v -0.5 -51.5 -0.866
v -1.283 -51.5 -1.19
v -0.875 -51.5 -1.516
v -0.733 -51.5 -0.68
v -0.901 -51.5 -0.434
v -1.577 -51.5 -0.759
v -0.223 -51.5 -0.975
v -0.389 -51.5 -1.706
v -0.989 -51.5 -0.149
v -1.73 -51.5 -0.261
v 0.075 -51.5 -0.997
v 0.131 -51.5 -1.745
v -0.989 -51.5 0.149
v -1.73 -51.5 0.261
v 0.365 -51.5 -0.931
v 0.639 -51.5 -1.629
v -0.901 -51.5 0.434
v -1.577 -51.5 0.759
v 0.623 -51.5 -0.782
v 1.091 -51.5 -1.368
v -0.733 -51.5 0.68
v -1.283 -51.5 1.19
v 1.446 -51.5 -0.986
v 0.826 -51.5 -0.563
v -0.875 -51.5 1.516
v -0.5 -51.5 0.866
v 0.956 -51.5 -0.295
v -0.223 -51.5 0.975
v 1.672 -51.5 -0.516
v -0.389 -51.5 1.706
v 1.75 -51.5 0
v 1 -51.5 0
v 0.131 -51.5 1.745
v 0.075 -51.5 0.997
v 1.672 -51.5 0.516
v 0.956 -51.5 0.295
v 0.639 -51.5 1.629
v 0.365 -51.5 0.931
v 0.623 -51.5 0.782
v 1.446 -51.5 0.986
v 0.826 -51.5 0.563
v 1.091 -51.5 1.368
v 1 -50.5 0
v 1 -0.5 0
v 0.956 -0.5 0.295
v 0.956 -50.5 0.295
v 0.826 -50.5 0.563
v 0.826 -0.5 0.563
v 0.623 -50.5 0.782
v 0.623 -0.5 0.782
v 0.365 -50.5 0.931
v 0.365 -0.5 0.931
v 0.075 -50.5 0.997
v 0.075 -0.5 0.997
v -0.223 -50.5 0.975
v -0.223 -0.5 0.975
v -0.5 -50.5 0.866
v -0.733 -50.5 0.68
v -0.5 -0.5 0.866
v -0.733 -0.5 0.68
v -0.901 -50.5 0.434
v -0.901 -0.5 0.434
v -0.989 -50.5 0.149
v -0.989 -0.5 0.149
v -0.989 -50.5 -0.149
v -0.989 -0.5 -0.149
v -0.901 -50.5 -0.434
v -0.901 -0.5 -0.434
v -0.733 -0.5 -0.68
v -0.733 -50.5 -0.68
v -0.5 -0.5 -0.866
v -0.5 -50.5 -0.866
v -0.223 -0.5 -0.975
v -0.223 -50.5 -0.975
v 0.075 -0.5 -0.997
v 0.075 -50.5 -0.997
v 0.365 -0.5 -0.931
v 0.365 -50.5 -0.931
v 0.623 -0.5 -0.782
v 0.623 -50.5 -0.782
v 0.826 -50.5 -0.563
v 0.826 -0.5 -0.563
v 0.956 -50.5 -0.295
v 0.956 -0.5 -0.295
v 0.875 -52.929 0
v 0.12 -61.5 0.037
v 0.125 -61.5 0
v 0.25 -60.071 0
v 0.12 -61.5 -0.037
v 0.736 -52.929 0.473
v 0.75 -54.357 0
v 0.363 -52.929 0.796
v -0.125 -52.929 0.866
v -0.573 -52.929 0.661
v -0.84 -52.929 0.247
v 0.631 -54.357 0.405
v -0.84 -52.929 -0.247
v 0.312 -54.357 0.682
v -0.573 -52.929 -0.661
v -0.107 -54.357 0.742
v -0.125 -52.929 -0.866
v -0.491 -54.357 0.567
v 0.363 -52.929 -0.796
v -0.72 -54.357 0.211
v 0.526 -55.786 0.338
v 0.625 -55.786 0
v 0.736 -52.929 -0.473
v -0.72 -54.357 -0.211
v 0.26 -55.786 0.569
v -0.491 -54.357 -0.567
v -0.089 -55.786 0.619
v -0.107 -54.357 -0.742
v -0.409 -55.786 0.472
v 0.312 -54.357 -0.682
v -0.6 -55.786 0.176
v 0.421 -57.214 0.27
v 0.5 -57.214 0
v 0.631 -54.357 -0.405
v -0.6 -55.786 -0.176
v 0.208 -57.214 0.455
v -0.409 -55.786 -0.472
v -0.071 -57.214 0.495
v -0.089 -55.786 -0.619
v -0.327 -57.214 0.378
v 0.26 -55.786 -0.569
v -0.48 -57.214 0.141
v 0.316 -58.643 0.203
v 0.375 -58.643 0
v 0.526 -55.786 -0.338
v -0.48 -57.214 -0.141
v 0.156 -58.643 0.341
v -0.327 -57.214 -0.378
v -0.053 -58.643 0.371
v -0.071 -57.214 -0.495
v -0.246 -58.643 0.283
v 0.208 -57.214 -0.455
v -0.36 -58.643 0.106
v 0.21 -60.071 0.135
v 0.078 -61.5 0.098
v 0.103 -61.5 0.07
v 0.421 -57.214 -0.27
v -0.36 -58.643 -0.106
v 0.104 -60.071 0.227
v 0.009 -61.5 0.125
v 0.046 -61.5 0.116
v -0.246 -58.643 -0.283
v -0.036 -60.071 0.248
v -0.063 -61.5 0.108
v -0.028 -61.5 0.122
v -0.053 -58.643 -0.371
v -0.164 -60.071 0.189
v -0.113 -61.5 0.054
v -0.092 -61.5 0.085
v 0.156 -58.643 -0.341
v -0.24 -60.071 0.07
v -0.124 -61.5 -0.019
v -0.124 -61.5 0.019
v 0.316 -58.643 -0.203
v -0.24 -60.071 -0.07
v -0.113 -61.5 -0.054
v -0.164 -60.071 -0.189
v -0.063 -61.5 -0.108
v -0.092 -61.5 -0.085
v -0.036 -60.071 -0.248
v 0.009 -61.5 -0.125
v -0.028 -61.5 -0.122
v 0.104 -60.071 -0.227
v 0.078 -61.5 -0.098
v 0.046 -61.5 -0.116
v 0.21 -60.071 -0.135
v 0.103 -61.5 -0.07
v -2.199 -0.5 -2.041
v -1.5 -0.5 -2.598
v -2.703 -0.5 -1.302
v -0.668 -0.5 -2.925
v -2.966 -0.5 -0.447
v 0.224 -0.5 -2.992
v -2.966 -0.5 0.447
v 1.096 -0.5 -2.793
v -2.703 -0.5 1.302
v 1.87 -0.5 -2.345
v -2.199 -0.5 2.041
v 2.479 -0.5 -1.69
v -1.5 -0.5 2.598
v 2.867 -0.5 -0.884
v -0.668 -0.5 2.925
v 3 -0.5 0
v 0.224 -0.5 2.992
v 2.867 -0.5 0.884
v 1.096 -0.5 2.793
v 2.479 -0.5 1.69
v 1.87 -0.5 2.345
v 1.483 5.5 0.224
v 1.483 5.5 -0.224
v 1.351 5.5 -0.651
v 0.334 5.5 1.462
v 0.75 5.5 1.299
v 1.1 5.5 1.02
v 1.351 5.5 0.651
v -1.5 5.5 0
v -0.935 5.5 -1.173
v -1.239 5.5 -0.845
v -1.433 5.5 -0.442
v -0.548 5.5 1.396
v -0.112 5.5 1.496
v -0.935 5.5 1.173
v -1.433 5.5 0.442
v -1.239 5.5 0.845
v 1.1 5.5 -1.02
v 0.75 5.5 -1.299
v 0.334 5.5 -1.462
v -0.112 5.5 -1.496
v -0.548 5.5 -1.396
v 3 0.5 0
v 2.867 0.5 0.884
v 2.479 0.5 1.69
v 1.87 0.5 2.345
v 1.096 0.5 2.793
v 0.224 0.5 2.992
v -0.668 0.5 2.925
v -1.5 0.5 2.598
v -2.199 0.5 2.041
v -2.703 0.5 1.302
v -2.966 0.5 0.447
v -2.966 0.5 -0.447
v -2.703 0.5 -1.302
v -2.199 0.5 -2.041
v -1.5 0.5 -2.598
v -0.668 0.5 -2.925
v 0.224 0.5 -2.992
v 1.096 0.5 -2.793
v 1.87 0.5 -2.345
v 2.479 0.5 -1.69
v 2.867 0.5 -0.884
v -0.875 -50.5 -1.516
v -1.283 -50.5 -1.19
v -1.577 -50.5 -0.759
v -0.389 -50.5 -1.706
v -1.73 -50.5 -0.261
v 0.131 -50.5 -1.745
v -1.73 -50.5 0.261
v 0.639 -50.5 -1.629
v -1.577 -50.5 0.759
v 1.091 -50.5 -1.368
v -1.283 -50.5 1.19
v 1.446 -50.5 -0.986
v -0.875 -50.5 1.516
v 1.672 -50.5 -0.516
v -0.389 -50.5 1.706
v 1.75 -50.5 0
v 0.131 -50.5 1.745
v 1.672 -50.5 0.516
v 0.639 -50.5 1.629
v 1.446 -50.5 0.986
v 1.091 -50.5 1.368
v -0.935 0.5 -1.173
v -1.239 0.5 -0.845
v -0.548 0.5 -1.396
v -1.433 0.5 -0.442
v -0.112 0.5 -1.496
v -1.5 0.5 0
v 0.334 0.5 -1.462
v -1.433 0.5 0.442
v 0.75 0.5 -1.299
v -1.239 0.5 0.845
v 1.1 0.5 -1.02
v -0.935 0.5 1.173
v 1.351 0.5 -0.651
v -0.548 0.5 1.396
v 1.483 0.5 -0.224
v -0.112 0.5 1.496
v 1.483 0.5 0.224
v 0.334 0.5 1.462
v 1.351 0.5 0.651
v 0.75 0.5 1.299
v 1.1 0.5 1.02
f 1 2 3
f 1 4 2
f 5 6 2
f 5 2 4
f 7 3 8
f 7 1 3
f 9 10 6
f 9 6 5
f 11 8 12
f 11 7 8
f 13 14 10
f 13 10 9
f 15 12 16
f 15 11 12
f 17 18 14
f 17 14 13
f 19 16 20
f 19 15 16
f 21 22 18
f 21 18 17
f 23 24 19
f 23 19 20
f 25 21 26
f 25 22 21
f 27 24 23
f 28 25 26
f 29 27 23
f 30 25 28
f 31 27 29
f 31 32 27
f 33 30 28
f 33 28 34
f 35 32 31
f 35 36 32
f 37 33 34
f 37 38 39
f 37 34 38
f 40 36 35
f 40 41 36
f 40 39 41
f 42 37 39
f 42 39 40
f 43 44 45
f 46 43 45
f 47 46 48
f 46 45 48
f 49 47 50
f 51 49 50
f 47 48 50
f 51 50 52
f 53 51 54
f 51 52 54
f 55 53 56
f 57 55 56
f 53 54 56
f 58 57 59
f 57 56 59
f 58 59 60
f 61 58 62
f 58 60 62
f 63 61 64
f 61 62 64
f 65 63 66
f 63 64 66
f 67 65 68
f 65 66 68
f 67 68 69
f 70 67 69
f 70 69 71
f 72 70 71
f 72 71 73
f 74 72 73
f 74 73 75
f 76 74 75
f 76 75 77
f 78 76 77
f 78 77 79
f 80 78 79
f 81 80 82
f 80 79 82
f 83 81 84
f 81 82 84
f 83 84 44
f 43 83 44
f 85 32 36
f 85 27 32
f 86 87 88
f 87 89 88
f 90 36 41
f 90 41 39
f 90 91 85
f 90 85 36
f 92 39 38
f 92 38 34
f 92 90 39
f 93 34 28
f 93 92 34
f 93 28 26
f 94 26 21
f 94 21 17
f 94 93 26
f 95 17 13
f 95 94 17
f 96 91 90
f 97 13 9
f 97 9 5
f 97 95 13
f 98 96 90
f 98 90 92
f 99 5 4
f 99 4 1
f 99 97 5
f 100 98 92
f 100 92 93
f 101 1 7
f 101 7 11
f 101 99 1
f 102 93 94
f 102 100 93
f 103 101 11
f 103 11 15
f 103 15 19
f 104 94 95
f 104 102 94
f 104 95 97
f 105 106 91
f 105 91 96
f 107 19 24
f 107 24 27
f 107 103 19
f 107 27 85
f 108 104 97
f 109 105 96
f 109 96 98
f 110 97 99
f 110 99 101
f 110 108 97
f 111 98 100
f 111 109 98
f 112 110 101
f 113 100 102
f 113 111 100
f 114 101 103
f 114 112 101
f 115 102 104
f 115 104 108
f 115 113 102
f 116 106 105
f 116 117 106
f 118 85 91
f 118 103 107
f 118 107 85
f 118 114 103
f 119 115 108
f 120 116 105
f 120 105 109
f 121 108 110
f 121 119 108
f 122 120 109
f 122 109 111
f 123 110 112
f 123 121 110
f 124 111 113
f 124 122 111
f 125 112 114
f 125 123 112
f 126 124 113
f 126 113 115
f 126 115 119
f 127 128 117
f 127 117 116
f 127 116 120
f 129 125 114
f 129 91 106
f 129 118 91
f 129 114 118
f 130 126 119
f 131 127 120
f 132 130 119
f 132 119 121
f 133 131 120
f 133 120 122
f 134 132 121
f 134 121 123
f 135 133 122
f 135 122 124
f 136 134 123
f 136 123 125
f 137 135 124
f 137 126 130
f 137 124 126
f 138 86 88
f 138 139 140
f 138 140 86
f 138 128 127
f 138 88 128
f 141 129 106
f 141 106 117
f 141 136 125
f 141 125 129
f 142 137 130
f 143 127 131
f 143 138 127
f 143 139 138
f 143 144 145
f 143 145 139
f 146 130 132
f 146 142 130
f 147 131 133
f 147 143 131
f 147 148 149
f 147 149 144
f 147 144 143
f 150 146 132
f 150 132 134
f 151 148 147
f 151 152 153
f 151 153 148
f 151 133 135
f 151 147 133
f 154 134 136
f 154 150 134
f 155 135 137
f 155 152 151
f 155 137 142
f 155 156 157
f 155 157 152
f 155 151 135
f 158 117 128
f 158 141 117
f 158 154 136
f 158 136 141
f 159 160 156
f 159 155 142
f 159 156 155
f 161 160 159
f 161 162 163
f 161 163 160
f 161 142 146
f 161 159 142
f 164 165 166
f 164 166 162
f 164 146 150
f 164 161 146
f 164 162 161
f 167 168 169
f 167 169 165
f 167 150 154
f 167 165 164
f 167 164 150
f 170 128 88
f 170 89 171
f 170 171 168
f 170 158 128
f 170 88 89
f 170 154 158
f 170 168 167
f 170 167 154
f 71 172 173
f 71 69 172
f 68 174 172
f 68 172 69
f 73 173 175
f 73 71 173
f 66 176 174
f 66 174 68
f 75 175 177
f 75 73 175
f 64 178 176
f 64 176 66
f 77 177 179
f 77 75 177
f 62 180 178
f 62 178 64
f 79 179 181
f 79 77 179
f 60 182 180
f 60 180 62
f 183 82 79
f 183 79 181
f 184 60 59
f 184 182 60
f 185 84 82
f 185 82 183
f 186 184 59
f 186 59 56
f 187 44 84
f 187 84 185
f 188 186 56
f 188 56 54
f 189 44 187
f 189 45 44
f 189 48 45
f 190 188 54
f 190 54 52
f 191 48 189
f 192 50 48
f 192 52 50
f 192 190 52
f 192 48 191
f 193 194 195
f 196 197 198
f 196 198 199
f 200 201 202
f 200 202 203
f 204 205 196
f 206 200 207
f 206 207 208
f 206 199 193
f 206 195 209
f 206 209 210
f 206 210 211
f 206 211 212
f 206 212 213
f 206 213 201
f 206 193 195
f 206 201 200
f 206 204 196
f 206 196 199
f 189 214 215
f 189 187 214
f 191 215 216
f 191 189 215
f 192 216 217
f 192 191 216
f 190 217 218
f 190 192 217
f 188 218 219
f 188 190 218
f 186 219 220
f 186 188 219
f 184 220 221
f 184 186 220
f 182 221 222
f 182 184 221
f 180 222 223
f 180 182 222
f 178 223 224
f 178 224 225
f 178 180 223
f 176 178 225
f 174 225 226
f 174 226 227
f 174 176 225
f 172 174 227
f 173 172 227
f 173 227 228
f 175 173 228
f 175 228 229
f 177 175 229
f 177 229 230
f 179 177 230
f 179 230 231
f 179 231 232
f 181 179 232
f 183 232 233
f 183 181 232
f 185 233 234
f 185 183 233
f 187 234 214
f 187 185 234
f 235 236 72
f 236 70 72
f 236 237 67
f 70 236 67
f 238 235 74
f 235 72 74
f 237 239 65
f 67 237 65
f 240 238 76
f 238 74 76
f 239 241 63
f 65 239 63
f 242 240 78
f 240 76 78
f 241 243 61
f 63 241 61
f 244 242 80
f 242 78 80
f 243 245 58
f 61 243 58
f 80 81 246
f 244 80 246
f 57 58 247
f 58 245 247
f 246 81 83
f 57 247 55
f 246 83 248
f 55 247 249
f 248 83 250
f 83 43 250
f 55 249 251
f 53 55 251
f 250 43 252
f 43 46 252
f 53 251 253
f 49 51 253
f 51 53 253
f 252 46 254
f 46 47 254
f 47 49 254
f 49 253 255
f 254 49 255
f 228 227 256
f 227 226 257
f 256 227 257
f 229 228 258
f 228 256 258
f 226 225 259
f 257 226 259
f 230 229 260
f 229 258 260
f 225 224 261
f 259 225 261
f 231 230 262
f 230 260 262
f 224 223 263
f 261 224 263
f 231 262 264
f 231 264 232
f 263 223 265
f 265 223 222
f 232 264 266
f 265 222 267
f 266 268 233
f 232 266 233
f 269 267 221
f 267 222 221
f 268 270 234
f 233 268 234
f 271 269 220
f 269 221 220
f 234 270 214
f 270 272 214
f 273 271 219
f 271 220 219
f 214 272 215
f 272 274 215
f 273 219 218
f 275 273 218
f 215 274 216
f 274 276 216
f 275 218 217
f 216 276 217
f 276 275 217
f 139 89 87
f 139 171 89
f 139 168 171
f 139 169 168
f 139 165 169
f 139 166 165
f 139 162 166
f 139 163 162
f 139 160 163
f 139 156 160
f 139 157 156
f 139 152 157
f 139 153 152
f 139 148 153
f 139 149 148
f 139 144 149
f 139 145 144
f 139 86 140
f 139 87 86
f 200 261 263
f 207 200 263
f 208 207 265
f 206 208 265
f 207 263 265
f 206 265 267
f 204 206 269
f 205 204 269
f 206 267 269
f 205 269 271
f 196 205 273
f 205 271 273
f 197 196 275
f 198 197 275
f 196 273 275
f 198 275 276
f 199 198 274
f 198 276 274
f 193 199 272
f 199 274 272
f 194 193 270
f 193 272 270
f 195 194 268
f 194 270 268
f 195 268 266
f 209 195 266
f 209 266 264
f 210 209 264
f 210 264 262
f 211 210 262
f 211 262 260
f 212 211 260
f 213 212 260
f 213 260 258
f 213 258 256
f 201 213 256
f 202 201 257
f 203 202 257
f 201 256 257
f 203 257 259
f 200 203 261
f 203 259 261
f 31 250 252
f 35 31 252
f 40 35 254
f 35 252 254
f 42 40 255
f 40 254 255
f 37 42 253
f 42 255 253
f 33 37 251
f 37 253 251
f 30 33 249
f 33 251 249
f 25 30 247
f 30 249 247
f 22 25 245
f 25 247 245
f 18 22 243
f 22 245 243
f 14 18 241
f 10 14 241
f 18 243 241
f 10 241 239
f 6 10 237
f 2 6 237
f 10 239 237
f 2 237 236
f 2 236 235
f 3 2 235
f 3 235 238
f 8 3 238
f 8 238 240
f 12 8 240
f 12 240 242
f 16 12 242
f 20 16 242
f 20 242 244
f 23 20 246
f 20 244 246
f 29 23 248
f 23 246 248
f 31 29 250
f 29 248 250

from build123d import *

# Parameters (mm, degrees)
F0_R     = 3
F1_DEPTH = 0.5
F2_R     = 1
F3_DEPTH = 50
F4_R     = 1.5
F5_DEPTH = 5
F6_R     = 1.75
F6_R_2   = 1
F7_DEPTH = 1
F8_R     = 1
F9_DEPTH = 10
F9_TAPER = 5


with BuildPart() as f1:
    # F0 (on Front) → F1 (new body, symmetric)
    with BuildSketch(Plane.XZ):
        Circle(F0_R)
    extrude(amount=F1_DEPTH, both=True)

    # F2 (on face) → F3 (join)
    with BuildSketch(Plane.XZ.offset(0.5)):
        Circle(F2_R)
    extrude(amount=F3_DEPTH)

    # F4 (on face) → F5 (join)
    with BuildSketch(Plane(origin=(0, 0.5, 0), x_dir=(-1, 0, 0), z_dir=(0, 1, 0))):
        Circle(F4_R)
    extrude(amount=F5_DEPTH)

    # F6 (on face) → F7 (join)
    with BuildSketch(Plane.XZ.offset(50.5)):
        Circle(F6_R)
        Circle(F6_R_2, mode=Mode.SUBTRACT)
        Circle(F6_R_2)
    extrude(amount=F7_DEPTH)

    # F8 (on face) → F9 (join)
    with BuildSketch(Plane.XZ.offset(51.5)):
        Circle(F8_R)
    extrude(amount=F9_DEPTH, taper=F9_TAPER)


solid = f1.part
